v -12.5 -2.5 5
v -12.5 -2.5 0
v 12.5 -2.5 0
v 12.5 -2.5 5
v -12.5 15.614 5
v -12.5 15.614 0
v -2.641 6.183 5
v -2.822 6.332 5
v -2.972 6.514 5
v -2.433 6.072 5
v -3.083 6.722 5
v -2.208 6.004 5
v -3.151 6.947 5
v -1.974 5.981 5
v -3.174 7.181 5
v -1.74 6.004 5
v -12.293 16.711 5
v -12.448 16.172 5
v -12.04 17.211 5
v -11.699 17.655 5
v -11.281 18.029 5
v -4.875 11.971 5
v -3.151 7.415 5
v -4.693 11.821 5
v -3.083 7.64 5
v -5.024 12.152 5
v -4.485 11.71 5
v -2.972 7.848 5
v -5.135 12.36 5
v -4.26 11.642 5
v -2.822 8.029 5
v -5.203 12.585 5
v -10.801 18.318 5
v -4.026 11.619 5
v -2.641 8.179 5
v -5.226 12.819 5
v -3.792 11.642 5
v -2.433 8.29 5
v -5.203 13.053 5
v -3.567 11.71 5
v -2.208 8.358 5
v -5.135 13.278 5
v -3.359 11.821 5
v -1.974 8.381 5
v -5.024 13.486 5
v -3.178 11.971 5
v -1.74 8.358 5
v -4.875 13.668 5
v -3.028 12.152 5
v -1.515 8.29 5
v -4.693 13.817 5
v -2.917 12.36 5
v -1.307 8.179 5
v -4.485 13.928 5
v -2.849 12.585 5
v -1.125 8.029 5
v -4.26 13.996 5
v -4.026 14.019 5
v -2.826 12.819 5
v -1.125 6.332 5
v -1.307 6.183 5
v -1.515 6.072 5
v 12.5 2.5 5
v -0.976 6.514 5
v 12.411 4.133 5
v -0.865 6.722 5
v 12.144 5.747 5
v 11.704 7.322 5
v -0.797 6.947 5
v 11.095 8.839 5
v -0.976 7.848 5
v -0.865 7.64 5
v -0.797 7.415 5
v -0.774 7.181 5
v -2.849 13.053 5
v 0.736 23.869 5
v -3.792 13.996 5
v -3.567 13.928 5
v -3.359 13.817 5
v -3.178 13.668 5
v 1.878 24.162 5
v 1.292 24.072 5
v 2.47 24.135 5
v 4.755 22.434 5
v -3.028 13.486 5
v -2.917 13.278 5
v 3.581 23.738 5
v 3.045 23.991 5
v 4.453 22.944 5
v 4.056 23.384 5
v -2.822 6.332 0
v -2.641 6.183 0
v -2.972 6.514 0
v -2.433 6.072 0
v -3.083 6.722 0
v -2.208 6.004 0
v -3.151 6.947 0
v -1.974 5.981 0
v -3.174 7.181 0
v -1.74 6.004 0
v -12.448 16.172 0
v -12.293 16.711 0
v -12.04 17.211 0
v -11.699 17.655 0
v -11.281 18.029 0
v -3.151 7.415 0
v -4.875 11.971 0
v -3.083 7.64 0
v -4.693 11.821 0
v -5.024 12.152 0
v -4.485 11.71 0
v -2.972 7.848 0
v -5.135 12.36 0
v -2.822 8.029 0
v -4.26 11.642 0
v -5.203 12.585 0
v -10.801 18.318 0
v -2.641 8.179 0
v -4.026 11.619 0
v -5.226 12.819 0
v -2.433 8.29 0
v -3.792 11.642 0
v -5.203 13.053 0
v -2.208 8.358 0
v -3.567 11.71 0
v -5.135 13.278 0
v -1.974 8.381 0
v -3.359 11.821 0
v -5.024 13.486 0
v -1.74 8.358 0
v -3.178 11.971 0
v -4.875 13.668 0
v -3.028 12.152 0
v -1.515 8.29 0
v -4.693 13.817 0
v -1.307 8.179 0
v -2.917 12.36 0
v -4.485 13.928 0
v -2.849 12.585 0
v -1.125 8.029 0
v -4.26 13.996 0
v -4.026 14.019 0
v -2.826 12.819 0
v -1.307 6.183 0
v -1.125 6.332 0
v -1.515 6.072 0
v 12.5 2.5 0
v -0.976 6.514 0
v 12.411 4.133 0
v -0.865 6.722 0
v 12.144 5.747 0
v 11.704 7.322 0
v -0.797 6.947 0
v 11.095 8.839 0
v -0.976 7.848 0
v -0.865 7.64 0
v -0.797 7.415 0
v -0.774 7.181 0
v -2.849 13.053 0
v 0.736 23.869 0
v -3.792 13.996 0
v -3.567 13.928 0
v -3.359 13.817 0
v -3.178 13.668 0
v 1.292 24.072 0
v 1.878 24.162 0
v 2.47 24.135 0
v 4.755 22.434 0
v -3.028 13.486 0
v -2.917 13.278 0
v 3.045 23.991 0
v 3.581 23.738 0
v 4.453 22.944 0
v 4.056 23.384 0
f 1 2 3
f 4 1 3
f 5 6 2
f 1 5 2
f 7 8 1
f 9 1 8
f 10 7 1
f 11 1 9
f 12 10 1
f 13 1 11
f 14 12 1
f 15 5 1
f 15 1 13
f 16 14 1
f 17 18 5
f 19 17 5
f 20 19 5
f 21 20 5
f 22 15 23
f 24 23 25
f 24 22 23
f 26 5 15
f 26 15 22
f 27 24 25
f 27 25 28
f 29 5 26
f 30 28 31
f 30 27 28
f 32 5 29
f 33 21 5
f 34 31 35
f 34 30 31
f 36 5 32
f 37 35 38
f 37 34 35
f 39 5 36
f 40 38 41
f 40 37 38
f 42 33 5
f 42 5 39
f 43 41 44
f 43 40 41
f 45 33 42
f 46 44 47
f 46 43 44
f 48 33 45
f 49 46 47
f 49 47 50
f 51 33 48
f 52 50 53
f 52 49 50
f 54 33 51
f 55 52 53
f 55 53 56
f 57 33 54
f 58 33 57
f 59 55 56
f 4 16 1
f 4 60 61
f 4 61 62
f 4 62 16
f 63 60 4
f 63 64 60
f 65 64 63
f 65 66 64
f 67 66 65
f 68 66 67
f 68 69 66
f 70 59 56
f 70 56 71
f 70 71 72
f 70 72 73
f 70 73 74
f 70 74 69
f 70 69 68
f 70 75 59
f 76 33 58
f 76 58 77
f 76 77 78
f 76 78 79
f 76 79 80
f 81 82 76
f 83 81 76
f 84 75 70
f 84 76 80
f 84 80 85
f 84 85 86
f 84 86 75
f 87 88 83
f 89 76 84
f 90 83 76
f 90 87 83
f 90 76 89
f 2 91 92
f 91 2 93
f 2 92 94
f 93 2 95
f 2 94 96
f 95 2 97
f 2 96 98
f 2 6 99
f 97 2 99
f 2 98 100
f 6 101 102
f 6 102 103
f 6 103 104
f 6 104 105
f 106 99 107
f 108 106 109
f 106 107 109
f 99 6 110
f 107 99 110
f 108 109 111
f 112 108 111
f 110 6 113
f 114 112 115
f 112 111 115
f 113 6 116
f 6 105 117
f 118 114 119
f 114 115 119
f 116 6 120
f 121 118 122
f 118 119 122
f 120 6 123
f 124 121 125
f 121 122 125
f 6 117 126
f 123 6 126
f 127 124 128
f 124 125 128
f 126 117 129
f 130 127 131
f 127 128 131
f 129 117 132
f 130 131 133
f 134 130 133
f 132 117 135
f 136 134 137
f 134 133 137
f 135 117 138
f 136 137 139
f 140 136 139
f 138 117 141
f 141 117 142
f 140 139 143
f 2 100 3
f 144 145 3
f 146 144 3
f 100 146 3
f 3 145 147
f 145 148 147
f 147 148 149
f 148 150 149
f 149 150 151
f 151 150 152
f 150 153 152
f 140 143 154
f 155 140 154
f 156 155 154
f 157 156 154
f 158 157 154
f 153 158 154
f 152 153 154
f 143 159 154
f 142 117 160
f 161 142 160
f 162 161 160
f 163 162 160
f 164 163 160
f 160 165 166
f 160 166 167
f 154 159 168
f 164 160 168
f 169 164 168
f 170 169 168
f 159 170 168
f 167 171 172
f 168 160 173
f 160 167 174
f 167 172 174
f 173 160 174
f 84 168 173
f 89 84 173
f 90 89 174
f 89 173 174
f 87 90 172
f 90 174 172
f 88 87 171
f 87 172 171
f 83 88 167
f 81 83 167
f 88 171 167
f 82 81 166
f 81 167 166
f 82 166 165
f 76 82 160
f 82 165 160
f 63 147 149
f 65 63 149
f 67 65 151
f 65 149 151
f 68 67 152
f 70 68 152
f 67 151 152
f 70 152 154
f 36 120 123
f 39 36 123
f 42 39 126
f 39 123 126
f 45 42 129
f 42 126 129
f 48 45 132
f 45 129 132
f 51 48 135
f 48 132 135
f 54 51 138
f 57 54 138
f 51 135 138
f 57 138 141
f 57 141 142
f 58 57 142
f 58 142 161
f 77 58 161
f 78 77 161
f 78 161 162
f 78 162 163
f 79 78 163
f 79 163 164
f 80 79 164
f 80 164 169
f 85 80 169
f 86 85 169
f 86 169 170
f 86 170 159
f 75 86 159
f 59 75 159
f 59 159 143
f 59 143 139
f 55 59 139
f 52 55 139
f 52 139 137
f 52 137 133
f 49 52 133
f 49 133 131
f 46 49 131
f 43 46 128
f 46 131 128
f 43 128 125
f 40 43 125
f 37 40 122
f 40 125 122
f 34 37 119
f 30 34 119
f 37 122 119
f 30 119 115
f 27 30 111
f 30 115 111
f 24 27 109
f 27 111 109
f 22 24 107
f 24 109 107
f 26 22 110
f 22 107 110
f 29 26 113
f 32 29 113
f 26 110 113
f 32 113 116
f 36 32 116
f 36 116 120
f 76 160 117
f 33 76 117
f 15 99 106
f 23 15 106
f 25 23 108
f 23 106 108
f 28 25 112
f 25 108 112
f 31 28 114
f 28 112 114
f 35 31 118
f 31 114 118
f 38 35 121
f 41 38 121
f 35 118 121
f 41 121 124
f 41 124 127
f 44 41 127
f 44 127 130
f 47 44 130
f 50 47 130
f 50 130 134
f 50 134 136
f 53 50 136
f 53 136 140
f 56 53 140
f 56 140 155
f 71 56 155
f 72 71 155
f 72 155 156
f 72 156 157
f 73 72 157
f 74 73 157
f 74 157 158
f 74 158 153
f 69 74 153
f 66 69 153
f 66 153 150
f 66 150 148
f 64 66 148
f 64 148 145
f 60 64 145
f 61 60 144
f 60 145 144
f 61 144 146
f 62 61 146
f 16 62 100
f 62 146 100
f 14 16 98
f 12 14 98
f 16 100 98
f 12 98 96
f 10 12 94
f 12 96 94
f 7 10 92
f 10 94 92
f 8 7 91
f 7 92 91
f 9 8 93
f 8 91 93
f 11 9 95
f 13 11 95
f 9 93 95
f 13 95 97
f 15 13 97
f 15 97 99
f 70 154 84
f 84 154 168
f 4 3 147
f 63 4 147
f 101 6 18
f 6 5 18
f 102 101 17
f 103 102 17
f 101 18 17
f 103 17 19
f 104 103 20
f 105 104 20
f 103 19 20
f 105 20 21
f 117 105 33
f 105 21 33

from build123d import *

# Parameters (mm, degrees)
BOSS_EXTRUDE1_DEPTH  = 5
M2_CLEARANCE_HOLE1_D = 2.4
FILLET1_R            = 3


with BuildPart() as part:
    # Sketch1 → Boss-Extrude1 (new body)
    with BuildSketch(Plane.XY):
        with BuildLine():
            Line((-12.5, 17.5), (-12.5, -2.5))
            Line((-12.5, -2.5), (12.5, -2.5))
            Line((12.5, -2.5), (12.5, 2.5))
            ThreePointArc((12.5, 2.5), (12.144440107, 5.746594209), (11.094616806, 8.839273926))
            Line((11.094616806, 8.839273926), (4.755342879, 22.433890732))
            ThreePointArc((4.755342879, 22.433890732), (3.045285311, 23.991312891), (0.735528696, 23.869308605))
            Line((0.735528696, 23.869308605), (-12.5, 17.5))
        make_face()
    extrude(amount=BOSS_EXTRUDE1_DEPTH)

    # M2 Clearance Hole1 (through all)
    with Locations(Plane.XY.offset(5)):
        with Locations((-4.02606043, 12.819077862), (-1.97393957, 7.180922138)):
            Hole(M2_CLEARANCE_HOLE1_D / 2)

    # Fillet1
    fillet1_edges = [part.edges().sort_by_distance(p)[0] for p in [
        (-12.5, 17.5, 2.5),
    ]]
    fillet(fillet1_edges, radius=FILLET1_R)


solid = part.part
